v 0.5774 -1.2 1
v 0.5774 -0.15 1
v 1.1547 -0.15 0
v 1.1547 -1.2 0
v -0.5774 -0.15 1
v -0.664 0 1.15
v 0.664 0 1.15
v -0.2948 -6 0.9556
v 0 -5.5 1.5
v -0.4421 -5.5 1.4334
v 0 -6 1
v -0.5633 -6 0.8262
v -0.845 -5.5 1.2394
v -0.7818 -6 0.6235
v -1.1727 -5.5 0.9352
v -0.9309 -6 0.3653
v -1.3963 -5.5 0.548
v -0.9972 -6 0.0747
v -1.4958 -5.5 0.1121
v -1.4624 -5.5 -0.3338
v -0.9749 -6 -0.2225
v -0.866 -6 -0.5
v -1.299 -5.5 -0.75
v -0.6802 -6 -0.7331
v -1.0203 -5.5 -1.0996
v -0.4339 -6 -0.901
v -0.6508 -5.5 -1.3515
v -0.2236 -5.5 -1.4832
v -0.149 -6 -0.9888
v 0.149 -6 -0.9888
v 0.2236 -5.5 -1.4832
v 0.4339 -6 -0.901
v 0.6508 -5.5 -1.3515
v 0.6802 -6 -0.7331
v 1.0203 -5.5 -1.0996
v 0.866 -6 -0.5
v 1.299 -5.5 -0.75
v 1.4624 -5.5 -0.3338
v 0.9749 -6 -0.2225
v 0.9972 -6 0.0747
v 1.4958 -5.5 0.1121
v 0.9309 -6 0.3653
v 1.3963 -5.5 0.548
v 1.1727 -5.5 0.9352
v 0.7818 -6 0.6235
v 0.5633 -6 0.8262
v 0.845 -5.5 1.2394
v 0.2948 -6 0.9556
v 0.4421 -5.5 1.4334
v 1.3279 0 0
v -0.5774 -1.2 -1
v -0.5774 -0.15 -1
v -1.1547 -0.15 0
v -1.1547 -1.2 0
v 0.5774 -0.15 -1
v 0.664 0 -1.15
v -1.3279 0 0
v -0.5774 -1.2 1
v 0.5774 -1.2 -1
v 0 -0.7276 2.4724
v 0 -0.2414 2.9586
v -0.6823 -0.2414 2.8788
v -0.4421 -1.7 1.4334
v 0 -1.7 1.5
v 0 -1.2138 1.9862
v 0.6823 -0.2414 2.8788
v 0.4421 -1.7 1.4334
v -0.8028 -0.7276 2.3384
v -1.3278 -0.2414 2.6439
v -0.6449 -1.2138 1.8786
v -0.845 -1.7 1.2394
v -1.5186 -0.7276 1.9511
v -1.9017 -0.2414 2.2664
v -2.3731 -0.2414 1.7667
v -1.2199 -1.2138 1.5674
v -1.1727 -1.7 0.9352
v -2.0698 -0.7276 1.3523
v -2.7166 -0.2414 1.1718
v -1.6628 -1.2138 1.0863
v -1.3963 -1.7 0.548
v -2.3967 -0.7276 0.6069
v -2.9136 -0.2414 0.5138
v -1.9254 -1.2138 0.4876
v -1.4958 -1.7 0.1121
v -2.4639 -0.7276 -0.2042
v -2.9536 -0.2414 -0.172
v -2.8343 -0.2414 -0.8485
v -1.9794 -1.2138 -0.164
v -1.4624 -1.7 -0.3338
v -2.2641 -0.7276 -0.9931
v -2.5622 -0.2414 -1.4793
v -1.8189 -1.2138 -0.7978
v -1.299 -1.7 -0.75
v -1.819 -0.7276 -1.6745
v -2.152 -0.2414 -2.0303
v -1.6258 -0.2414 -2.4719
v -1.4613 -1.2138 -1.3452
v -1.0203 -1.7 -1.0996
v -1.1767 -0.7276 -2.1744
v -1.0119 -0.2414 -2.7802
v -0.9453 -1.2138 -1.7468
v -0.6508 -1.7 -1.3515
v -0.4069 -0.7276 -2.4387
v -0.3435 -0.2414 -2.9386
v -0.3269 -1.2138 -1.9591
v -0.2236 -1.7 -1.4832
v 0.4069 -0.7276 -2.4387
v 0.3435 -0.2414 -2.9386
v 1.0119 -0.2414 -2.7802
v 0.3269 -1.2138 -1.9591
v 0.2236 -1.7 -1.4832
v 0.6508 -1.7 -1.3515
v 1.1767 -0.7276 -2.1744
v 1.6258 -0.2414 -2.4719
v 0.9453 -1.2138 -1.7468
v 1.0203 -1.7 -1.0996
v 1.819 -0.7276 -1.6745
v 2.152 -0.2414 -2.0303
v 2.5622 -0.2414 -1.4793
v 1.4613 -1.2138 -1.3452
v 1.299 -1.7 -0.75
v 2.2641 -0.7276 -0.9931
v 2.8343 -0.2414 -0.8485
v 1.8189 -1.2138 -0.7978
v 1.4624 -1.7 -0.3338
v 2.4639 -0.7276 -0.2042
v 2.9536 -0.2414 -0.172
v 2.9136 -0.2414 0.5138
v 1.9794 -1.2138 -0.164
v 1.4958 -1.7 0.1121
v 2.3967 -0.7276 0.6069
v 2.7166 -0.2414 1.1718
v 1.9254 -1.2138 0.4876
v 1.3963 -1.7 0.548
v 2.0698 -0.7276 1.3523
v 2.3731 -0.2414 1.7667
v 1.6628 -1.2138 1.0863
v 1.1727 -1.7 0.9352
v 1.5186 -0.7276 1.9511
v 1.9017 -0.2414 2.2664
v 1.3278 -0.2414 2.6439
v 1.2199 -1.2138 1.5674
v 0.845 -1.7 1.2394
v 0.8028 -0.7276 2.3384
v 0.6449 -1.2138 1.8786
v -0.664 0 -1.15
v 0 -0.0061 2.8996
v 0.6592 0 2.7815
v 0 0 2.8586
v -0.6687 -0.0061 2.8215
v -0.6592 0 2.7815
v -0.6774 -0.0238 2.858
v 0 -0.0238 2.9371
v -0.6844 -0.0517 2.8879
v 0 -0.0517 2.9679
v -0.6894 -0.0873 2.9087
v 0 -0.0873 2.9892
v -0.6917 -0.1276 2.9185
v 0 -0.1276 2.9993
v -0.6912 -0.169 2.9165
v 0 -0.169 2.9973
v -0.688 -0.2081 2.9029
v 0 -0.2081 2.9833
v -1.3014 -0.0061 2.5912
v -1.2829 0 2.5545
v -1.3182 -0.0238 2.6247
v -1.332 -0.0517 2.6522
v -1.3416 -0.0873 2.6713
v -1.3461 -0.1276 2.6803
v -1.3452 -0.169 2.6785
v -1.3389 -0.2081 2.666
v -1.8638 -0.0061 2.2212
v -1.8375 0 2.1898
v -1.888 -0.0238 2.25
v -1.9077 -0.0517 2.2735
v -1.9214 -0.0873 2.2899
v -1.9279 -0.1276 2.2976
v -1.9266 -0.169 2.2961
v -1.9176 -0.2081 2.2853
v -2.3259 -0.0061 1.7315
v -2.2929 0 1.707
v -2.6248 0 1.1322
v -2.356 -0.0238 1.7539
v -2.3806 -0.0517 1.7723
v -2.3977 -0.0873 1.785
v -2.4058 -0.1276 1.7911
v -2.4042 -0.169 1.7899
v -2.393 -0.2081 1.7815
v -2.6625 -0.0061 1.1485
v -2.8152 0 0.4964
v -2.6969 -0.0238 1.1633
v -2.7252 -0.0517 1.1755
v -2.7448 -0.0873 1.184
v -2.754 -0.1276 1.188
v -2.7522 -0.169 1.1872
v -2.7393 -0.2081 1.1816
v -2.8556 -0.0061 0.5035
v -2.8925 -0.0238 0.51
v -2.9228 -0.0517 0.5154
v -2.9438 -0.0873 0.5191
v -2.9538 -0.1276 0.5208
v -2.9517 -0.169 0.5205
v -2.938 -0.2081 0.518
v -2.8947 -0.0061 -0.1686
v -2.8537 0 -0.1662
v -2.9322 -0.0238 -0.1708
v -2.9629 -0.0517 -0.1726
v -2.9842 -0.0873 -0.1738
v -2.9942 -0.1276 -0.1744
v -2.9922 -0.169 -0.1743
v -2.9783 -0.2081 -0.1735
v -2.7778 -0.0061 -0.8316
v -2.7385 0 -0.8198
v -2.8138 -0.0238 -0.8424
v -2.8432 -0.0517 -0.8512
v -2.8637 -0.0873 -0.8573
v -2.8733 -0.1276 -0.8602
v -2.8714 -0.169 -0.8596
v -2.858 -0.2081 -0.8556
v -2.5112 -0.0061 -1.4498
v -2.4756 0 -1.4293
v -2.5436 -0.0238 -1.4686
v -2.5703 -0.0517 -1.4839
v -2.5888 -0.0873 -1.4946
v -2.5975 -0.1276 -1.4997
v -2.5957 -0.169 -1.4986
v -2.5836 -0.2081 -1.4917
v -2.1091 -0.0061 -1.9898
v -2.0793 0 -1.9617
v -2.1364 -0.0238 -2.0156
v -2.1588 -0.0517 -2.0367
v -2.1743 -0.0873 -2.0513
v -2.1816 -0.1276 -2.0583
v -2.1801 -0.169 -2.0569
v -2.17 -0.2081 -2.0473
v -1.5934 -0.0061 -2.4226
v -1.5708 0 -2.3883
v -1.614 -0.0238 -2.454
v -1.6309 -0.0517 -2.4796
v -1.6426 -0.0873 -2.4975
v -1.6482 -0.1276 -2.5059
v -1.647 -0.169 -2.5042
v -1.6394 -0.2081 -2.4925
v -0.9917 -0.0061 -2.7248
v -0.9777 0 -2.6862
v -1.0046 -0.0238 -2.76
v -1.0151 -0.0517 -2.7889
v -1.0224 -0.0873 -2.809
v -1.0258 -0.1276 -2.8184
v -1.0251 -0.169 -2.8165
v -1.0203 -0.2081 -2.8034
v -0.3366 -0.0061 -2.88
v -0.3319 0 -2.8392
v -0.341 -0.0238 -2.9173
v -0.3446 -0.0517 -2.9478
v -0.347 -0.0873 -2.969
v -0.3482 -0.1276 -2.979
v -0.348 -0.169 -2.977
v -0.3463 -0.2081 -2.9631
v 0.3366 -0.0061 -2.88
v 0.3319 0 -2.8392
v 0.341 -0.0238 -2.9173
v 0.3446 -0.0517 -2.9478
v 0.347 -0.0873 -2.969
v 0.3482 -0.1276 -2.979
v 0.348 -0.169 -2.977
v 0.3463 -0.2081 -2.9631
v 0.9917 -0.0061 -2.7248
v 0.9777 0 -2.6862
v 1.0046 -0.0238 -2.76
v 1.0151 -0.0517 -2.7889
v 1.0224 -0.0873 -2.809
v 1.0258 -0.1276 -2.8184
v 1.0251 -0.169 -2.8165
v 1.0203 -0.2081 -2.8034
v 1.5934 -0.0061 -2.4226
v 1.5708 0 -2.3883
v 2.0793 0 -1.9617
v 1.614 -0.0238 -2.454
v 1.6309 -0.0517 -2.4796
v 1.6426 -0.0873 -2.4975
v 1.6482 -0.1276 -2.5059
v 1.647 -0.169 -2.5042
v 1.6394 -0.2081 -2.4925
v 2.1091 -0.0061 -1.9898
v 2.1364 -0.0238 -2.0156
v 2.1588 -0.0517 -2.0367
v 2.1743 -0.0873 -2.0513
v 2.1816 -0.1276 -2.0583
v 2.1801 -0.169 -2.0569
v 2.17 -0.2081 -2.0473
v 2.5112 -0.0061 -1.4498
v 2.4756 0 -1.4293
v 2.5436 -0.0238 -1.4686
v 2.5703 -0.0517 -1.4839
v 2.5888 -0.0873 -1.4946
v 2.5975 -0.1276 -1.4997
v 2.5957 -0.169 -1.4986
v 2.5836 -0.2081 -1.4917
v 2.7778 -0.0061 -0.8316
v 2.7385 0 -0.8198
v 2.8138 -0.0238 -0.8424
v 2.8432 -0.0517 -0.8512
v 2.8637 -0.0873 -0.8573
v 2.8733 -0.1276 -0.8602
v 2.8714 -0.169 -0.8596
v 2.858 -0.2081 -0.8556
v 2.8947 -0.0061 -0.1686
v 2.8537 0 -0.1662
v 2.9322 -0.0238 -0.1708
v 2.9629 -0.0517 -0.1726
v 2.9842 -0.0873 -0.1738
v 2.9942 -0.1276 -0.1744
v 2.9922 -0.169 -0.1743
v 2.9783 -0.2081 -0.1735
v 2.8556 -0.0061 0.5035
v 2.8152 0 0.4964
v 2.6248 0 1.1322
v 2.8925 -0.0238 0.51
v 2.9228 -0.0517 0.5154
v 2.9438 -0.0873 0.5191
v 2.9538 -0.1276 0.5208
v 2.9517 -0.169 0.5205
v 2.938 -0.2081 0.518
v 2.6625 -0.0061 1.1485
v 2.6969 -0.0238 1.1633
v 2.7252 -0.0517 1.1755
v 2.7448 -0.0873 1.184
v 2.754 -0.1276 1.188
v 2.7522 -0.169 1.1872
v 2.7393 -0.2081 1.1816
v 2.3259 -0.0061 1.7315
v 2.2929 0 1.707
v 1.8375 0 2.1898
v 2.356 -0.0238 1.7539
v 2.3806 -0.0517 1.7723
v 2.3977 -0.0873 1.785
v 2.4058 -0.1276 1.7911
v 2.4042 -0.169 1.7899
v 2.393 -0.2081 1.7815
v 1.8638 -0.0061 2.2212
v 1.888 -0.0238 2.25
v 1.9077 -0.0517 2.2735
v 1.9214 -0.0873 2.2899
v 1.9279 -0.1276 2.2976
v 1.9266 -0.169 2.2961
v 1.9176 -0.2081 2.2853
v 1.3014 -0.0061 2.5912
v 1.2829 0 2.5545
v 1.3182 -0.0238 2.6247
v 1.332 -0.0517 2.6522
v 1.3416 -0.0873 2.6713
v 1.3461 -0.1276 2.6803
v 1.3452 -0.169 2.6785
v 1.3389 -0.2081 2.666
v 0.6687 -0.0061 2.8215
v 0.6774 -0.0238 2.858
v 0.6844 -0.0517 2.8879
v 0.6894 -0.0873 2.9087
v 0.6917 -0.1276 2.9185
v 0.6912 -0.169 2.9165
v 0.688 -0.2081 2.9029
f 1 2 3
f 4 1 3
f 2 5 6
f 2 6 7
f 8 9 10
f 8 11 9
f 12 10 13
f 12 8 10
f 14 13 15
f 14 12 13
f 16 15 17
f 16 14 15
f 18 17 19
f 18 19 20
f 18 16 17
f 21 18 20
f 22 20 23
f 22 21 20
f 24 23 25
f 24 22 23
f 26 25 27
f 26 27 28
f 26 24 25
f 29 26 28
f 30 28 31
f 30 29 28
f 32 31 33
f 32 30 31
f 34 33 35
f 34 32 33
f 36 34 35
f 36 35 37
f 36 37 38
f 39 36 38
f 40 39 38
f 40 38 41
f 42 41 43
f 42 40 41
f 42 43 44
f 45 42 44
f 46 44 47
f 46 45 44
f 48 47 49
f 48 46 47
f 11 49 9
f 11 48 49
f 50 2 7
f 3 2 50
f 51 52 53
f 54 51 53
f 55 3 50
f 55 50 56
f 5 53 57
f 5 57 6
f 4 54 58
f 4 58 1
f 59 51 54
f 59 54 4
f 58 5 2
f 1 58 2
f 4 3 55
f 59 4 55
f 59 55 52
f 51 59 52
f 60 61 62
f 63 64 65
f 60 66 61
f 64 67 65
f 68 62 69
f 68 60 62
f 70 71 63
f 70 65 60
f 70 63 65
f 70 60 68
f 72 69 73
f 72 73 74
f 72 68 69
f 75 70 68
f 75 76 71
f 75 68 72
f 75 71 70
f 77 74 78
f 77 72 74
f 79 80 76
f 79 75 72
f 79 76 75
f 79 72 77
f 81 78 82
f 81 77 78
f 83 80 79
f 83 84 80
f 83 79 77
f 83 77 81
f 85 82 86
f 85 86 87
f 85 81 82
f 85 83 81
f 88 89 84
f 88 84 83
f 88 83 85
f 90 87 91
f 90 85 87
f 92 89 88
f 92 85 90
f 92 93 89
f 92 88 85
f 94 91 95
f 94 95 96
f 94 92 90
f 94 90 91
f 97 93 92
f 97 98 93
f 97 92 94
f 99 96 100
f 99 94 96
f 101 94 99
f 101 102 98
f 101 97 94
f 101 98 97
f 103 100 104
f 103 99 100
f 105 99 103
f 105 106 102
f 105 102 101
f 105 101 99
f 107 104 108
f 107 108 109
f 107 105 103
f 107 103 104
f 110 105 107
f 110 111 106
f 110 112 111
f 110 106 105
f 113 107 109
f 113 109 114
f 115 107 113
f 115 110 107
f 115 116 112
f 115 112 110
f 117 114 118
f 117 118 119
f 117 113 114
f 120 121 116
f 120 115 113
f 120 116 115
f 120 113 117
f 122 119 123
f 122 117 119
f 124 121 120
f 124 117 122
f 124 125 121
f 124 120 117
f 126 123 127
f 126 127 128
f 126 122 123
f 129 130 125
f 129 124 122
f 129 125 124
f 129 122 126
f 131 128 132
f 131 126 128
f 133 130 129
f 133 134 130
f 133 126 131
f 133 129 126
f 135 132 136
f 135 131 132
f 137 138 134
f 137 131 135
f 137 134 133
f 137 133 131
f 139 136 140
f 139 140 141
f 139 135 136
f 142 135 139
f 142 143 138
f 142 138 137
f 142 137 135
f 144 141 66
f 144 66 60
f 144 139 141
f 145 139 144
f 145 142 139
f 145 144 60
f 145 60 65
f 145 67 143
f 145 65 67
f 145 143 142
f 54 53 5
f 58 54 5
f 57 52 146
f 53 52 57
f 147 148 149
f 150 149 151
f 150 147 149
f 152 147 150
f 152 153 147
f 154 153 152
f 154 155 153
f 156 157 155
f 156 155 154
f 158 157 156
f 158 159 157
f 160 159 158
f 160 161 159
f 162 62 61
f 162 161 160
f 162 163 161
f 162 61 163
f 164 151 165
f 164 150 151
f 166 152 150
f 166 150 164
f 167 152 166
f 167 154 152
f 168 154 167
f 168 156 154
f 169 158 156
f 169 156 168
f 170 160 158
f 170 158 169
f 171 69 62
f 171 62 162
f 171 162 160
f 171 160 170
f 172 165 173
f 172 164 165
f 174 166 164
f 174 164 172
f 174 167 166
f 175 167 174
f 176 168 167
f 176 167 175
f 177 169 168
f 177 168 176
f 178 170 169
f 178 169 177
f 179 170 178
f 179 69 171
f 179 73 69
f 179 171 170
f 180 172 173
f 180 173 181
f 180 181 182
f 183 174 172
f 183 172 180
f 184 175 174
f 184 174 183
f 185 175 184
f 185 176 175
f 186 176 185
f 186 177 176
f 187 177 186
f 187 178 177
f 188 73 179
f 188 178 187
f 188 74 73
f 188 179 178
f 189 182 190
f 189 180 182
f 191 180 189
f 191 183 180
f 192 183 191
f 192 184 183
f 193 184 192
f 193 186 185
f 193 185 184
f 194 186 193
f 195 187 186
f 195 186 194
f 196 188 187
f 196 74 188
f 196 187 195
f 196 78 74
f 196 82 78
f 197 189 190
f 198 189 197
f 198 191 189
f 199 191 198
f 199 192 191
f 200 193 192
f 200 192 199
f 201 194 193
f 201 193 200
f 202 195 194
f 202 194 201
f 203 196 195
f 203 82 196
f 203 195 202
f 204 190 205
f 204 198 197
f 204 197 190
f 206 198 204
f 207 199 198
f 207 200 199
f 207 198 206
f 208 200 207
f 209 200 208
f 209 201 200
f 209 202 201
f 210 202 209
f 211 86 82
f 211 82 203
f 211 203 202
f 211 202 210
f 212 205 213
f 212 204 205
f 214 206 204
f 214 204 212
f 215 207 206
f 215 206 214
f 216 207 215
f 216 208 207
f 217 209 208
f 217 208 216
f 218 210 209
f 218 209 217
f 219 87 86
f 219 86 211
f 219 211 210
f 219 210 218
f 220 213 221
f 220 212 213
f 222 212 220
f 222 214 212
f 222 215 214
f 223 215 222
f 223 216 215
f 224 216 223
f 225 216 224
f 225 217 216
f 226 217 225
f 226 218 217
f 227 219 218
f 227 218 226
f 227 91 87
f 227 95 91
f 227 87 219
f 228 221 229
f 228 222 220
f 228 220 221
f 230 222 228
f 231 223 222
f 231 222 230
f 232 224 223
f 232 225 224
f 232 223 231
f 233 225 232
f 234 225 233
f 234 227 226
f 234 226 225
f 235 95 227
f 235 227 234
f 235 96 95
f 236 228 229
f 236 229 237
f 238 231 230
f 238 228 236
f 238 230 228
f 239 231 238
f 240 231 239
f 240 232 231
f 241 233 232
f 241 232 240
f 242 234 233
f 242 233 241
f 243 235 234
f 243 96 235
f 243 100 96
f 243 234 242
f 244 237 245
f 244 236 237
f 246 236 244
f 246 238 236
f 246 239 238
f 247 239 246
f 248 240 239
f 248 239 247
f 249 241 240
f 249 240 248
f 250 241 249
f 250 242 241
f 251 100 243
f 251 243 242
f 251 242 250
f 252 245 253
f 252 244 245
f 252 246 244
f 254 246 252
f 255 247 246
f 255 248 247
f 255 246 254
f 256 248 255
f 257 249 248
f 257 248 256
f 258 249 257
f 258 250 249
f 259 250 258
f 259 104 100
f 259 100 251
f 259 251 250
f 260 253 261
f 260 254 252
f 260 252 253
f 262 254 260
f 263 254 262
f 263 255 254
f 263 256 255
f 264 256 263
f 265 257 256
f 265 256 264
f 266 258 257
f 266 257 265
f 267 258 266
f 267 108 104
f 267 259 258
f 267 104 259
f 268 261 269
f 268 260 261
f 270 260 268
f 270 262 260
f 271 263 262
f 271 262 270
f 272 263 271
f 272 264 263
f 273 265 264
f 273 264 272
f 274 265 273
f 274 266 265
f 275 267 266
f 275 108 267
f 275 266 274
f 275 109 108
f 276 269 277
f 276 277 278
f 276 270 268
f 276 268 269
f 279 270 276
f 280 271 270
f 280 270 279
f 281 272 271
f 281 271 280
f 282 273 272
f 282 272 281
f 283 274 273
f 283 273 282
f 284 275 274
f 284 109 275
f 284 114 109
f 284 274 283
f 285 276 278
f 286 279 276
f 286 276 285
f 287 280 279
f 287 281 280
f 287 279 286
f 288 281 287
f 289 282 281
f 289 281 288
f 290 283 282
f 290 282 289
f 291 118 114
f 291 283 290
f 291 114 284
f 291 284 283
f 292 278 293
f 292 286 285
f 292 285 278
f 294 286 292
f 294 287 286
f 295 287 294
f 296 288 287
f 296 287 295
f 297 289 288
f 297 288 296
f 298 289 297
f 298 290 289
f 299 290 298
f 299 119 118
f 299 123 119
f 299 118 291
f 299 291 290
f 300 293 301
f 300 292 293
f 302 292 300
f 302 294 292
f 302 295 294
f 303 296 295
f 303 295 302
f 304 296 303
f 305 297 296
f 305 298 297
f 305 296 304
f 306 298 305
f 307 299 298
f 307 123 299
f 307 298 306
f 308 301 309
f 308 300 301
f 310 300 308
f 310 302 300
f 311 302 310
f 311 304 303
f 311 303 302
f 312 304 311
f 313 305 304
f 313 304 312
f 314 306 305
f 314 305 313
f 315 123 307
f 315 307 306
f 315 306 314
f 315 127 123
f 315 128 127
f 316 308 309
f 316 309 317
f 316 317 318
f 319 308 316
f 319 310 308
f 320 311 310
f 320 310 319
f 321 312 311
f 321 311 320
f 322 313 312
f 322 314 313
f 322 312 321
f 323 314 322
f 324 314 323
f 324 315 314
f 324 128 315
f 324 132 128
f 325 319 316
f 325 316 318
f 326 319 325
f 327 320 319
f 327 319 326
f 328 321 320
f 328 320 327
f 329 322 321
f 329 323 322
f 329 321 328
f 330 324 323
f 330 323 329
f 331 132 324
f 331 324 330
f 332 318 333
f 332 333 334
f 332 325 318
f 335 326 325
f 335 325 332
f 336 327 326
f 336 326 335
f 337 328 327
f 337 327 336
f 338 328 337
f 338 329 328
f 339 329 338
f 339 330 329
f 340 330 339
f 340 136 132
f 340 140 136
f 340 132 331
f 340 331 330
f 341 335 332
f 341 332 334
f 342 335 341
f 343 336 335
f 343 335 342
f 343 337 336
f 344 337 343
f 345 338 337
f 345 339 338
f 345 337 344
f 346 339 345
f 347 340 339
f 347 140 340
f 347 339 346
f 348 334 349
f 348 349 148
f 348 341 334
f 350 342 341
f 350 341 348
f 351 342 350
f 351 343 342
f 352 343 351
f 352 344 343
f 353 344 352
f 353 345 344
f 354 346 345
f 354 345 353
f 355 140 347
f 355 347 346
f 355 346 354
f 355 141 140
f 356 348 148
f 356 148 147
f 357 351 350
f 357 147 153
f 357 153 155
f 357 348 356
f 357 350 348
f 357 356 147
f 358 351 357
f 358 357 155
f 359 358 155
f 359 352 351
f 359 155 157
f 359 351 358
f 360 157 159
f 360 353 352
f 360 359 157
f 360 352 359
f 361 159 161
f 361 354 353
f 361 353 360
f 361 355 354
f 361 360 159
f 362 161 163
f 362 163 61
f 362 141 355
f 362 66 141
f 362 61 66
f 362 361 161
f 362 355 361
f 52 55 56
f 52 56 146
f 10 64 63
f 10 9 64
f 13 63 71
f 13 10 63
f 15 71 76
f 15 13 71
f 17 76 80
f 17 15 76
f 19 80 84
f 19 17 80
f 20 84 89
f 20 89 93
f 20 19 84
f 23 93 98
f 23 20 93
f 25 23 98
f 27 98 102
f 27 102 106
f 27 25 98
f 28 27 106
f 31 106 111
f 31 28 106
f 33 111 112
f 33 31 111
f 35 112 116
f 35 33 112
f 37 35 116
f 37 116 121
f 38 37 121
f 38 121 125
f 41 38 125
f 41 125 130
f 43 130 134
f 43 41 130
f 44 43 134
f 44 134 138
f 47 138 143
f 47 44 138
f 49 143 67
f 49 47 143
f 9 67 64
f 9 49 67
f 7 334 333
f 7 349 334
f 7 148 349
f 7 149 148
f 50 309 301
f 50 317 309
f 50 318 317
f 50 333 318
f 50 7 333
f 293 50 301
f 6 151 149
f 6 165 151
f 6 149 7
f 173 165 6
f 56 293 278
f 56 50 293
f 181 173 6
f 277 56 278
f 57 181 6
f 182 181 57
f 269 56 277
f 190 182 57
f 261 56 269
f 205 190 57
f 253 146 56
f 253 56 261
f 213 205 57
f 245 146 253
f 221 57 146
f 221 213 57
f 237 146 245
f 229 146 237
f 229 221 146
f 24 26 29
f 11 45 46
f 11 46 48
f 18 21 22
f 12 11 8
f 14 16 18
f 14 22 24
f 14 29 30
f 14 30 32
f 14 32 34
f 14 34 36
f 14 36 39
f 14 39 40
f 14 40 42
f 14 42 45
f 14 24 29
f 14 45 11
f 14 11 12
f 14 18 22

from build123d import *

# Parameters (mm, degrees)
ENL_V_MAT_EXTRU_1_DEPTH = 1.2
CHANFREIN1_SIZE         = 0.15


with BuildPart() as part:
    # Esquisse1 → Révolution1 (revolve)
    with BuildSketch(Plane.XY, mode=Mode.PRIVATE) as r_volution1_sk:
        with BuildLine():
            Line((1.5, -5.5), (1, -6))
            Line((1, -6), (0, -6))
            Line((0, -6), (0, 0))
            Line((0, 0), (2.858578644, 0))
            ThreePointArc((2.858578644, 0), (2.98923494, -0.087301746), (2.958578644, -0.241421356))
            Line((2.958578644, -0.241421356), (1.5, -1.7))
            Line((1.5, -1.7), (1.5, -5.5))
        make_face()
    revolve(r_volution1_sk.sketch.rotate(Axis((0, 6.972972973, 0), (0, -1, 0)), 90), axis=Axis((0, 6.972972973, 0), (0, -1, 0)))

    # Esquisse2 → Enlèv. mat.-Extru.1 (cut)
    with BuildSketch(Plane(origin=(0, 0, 0), x_dir=(1, 0, 0), z_dir=(0, 1, 0))):
        Polygon((-1.154700538, 0), (-0.577350269, -1), (0.577350269, -1), (1.154700538, 0), (0.577350269, 1), (-0.577350269, 1), align=None)
    extrude(amount=-ENL_V_MAT_EXTRU_1_DEPTH, mode=Mode.SUBTRACT)

    # Chanfrein1
    chanfrein1_edges = [part.edges().sort_by_distance(p)[0] for p in [
        (-0.8660254037844384, 0, -0.49999999999999983),
        (-0.8660254037844384, 0, 0.5),
        (0, 0, 1),
        (0.866025403784439, 0, 0.5),
        (0.866025403784439, 0, -0.5000000000000004),
        (0, 0, -1),
    ]]
    chamfer(chanfrein1_edges, length=CHANFREIN1_SIZE)


solid = part.part
